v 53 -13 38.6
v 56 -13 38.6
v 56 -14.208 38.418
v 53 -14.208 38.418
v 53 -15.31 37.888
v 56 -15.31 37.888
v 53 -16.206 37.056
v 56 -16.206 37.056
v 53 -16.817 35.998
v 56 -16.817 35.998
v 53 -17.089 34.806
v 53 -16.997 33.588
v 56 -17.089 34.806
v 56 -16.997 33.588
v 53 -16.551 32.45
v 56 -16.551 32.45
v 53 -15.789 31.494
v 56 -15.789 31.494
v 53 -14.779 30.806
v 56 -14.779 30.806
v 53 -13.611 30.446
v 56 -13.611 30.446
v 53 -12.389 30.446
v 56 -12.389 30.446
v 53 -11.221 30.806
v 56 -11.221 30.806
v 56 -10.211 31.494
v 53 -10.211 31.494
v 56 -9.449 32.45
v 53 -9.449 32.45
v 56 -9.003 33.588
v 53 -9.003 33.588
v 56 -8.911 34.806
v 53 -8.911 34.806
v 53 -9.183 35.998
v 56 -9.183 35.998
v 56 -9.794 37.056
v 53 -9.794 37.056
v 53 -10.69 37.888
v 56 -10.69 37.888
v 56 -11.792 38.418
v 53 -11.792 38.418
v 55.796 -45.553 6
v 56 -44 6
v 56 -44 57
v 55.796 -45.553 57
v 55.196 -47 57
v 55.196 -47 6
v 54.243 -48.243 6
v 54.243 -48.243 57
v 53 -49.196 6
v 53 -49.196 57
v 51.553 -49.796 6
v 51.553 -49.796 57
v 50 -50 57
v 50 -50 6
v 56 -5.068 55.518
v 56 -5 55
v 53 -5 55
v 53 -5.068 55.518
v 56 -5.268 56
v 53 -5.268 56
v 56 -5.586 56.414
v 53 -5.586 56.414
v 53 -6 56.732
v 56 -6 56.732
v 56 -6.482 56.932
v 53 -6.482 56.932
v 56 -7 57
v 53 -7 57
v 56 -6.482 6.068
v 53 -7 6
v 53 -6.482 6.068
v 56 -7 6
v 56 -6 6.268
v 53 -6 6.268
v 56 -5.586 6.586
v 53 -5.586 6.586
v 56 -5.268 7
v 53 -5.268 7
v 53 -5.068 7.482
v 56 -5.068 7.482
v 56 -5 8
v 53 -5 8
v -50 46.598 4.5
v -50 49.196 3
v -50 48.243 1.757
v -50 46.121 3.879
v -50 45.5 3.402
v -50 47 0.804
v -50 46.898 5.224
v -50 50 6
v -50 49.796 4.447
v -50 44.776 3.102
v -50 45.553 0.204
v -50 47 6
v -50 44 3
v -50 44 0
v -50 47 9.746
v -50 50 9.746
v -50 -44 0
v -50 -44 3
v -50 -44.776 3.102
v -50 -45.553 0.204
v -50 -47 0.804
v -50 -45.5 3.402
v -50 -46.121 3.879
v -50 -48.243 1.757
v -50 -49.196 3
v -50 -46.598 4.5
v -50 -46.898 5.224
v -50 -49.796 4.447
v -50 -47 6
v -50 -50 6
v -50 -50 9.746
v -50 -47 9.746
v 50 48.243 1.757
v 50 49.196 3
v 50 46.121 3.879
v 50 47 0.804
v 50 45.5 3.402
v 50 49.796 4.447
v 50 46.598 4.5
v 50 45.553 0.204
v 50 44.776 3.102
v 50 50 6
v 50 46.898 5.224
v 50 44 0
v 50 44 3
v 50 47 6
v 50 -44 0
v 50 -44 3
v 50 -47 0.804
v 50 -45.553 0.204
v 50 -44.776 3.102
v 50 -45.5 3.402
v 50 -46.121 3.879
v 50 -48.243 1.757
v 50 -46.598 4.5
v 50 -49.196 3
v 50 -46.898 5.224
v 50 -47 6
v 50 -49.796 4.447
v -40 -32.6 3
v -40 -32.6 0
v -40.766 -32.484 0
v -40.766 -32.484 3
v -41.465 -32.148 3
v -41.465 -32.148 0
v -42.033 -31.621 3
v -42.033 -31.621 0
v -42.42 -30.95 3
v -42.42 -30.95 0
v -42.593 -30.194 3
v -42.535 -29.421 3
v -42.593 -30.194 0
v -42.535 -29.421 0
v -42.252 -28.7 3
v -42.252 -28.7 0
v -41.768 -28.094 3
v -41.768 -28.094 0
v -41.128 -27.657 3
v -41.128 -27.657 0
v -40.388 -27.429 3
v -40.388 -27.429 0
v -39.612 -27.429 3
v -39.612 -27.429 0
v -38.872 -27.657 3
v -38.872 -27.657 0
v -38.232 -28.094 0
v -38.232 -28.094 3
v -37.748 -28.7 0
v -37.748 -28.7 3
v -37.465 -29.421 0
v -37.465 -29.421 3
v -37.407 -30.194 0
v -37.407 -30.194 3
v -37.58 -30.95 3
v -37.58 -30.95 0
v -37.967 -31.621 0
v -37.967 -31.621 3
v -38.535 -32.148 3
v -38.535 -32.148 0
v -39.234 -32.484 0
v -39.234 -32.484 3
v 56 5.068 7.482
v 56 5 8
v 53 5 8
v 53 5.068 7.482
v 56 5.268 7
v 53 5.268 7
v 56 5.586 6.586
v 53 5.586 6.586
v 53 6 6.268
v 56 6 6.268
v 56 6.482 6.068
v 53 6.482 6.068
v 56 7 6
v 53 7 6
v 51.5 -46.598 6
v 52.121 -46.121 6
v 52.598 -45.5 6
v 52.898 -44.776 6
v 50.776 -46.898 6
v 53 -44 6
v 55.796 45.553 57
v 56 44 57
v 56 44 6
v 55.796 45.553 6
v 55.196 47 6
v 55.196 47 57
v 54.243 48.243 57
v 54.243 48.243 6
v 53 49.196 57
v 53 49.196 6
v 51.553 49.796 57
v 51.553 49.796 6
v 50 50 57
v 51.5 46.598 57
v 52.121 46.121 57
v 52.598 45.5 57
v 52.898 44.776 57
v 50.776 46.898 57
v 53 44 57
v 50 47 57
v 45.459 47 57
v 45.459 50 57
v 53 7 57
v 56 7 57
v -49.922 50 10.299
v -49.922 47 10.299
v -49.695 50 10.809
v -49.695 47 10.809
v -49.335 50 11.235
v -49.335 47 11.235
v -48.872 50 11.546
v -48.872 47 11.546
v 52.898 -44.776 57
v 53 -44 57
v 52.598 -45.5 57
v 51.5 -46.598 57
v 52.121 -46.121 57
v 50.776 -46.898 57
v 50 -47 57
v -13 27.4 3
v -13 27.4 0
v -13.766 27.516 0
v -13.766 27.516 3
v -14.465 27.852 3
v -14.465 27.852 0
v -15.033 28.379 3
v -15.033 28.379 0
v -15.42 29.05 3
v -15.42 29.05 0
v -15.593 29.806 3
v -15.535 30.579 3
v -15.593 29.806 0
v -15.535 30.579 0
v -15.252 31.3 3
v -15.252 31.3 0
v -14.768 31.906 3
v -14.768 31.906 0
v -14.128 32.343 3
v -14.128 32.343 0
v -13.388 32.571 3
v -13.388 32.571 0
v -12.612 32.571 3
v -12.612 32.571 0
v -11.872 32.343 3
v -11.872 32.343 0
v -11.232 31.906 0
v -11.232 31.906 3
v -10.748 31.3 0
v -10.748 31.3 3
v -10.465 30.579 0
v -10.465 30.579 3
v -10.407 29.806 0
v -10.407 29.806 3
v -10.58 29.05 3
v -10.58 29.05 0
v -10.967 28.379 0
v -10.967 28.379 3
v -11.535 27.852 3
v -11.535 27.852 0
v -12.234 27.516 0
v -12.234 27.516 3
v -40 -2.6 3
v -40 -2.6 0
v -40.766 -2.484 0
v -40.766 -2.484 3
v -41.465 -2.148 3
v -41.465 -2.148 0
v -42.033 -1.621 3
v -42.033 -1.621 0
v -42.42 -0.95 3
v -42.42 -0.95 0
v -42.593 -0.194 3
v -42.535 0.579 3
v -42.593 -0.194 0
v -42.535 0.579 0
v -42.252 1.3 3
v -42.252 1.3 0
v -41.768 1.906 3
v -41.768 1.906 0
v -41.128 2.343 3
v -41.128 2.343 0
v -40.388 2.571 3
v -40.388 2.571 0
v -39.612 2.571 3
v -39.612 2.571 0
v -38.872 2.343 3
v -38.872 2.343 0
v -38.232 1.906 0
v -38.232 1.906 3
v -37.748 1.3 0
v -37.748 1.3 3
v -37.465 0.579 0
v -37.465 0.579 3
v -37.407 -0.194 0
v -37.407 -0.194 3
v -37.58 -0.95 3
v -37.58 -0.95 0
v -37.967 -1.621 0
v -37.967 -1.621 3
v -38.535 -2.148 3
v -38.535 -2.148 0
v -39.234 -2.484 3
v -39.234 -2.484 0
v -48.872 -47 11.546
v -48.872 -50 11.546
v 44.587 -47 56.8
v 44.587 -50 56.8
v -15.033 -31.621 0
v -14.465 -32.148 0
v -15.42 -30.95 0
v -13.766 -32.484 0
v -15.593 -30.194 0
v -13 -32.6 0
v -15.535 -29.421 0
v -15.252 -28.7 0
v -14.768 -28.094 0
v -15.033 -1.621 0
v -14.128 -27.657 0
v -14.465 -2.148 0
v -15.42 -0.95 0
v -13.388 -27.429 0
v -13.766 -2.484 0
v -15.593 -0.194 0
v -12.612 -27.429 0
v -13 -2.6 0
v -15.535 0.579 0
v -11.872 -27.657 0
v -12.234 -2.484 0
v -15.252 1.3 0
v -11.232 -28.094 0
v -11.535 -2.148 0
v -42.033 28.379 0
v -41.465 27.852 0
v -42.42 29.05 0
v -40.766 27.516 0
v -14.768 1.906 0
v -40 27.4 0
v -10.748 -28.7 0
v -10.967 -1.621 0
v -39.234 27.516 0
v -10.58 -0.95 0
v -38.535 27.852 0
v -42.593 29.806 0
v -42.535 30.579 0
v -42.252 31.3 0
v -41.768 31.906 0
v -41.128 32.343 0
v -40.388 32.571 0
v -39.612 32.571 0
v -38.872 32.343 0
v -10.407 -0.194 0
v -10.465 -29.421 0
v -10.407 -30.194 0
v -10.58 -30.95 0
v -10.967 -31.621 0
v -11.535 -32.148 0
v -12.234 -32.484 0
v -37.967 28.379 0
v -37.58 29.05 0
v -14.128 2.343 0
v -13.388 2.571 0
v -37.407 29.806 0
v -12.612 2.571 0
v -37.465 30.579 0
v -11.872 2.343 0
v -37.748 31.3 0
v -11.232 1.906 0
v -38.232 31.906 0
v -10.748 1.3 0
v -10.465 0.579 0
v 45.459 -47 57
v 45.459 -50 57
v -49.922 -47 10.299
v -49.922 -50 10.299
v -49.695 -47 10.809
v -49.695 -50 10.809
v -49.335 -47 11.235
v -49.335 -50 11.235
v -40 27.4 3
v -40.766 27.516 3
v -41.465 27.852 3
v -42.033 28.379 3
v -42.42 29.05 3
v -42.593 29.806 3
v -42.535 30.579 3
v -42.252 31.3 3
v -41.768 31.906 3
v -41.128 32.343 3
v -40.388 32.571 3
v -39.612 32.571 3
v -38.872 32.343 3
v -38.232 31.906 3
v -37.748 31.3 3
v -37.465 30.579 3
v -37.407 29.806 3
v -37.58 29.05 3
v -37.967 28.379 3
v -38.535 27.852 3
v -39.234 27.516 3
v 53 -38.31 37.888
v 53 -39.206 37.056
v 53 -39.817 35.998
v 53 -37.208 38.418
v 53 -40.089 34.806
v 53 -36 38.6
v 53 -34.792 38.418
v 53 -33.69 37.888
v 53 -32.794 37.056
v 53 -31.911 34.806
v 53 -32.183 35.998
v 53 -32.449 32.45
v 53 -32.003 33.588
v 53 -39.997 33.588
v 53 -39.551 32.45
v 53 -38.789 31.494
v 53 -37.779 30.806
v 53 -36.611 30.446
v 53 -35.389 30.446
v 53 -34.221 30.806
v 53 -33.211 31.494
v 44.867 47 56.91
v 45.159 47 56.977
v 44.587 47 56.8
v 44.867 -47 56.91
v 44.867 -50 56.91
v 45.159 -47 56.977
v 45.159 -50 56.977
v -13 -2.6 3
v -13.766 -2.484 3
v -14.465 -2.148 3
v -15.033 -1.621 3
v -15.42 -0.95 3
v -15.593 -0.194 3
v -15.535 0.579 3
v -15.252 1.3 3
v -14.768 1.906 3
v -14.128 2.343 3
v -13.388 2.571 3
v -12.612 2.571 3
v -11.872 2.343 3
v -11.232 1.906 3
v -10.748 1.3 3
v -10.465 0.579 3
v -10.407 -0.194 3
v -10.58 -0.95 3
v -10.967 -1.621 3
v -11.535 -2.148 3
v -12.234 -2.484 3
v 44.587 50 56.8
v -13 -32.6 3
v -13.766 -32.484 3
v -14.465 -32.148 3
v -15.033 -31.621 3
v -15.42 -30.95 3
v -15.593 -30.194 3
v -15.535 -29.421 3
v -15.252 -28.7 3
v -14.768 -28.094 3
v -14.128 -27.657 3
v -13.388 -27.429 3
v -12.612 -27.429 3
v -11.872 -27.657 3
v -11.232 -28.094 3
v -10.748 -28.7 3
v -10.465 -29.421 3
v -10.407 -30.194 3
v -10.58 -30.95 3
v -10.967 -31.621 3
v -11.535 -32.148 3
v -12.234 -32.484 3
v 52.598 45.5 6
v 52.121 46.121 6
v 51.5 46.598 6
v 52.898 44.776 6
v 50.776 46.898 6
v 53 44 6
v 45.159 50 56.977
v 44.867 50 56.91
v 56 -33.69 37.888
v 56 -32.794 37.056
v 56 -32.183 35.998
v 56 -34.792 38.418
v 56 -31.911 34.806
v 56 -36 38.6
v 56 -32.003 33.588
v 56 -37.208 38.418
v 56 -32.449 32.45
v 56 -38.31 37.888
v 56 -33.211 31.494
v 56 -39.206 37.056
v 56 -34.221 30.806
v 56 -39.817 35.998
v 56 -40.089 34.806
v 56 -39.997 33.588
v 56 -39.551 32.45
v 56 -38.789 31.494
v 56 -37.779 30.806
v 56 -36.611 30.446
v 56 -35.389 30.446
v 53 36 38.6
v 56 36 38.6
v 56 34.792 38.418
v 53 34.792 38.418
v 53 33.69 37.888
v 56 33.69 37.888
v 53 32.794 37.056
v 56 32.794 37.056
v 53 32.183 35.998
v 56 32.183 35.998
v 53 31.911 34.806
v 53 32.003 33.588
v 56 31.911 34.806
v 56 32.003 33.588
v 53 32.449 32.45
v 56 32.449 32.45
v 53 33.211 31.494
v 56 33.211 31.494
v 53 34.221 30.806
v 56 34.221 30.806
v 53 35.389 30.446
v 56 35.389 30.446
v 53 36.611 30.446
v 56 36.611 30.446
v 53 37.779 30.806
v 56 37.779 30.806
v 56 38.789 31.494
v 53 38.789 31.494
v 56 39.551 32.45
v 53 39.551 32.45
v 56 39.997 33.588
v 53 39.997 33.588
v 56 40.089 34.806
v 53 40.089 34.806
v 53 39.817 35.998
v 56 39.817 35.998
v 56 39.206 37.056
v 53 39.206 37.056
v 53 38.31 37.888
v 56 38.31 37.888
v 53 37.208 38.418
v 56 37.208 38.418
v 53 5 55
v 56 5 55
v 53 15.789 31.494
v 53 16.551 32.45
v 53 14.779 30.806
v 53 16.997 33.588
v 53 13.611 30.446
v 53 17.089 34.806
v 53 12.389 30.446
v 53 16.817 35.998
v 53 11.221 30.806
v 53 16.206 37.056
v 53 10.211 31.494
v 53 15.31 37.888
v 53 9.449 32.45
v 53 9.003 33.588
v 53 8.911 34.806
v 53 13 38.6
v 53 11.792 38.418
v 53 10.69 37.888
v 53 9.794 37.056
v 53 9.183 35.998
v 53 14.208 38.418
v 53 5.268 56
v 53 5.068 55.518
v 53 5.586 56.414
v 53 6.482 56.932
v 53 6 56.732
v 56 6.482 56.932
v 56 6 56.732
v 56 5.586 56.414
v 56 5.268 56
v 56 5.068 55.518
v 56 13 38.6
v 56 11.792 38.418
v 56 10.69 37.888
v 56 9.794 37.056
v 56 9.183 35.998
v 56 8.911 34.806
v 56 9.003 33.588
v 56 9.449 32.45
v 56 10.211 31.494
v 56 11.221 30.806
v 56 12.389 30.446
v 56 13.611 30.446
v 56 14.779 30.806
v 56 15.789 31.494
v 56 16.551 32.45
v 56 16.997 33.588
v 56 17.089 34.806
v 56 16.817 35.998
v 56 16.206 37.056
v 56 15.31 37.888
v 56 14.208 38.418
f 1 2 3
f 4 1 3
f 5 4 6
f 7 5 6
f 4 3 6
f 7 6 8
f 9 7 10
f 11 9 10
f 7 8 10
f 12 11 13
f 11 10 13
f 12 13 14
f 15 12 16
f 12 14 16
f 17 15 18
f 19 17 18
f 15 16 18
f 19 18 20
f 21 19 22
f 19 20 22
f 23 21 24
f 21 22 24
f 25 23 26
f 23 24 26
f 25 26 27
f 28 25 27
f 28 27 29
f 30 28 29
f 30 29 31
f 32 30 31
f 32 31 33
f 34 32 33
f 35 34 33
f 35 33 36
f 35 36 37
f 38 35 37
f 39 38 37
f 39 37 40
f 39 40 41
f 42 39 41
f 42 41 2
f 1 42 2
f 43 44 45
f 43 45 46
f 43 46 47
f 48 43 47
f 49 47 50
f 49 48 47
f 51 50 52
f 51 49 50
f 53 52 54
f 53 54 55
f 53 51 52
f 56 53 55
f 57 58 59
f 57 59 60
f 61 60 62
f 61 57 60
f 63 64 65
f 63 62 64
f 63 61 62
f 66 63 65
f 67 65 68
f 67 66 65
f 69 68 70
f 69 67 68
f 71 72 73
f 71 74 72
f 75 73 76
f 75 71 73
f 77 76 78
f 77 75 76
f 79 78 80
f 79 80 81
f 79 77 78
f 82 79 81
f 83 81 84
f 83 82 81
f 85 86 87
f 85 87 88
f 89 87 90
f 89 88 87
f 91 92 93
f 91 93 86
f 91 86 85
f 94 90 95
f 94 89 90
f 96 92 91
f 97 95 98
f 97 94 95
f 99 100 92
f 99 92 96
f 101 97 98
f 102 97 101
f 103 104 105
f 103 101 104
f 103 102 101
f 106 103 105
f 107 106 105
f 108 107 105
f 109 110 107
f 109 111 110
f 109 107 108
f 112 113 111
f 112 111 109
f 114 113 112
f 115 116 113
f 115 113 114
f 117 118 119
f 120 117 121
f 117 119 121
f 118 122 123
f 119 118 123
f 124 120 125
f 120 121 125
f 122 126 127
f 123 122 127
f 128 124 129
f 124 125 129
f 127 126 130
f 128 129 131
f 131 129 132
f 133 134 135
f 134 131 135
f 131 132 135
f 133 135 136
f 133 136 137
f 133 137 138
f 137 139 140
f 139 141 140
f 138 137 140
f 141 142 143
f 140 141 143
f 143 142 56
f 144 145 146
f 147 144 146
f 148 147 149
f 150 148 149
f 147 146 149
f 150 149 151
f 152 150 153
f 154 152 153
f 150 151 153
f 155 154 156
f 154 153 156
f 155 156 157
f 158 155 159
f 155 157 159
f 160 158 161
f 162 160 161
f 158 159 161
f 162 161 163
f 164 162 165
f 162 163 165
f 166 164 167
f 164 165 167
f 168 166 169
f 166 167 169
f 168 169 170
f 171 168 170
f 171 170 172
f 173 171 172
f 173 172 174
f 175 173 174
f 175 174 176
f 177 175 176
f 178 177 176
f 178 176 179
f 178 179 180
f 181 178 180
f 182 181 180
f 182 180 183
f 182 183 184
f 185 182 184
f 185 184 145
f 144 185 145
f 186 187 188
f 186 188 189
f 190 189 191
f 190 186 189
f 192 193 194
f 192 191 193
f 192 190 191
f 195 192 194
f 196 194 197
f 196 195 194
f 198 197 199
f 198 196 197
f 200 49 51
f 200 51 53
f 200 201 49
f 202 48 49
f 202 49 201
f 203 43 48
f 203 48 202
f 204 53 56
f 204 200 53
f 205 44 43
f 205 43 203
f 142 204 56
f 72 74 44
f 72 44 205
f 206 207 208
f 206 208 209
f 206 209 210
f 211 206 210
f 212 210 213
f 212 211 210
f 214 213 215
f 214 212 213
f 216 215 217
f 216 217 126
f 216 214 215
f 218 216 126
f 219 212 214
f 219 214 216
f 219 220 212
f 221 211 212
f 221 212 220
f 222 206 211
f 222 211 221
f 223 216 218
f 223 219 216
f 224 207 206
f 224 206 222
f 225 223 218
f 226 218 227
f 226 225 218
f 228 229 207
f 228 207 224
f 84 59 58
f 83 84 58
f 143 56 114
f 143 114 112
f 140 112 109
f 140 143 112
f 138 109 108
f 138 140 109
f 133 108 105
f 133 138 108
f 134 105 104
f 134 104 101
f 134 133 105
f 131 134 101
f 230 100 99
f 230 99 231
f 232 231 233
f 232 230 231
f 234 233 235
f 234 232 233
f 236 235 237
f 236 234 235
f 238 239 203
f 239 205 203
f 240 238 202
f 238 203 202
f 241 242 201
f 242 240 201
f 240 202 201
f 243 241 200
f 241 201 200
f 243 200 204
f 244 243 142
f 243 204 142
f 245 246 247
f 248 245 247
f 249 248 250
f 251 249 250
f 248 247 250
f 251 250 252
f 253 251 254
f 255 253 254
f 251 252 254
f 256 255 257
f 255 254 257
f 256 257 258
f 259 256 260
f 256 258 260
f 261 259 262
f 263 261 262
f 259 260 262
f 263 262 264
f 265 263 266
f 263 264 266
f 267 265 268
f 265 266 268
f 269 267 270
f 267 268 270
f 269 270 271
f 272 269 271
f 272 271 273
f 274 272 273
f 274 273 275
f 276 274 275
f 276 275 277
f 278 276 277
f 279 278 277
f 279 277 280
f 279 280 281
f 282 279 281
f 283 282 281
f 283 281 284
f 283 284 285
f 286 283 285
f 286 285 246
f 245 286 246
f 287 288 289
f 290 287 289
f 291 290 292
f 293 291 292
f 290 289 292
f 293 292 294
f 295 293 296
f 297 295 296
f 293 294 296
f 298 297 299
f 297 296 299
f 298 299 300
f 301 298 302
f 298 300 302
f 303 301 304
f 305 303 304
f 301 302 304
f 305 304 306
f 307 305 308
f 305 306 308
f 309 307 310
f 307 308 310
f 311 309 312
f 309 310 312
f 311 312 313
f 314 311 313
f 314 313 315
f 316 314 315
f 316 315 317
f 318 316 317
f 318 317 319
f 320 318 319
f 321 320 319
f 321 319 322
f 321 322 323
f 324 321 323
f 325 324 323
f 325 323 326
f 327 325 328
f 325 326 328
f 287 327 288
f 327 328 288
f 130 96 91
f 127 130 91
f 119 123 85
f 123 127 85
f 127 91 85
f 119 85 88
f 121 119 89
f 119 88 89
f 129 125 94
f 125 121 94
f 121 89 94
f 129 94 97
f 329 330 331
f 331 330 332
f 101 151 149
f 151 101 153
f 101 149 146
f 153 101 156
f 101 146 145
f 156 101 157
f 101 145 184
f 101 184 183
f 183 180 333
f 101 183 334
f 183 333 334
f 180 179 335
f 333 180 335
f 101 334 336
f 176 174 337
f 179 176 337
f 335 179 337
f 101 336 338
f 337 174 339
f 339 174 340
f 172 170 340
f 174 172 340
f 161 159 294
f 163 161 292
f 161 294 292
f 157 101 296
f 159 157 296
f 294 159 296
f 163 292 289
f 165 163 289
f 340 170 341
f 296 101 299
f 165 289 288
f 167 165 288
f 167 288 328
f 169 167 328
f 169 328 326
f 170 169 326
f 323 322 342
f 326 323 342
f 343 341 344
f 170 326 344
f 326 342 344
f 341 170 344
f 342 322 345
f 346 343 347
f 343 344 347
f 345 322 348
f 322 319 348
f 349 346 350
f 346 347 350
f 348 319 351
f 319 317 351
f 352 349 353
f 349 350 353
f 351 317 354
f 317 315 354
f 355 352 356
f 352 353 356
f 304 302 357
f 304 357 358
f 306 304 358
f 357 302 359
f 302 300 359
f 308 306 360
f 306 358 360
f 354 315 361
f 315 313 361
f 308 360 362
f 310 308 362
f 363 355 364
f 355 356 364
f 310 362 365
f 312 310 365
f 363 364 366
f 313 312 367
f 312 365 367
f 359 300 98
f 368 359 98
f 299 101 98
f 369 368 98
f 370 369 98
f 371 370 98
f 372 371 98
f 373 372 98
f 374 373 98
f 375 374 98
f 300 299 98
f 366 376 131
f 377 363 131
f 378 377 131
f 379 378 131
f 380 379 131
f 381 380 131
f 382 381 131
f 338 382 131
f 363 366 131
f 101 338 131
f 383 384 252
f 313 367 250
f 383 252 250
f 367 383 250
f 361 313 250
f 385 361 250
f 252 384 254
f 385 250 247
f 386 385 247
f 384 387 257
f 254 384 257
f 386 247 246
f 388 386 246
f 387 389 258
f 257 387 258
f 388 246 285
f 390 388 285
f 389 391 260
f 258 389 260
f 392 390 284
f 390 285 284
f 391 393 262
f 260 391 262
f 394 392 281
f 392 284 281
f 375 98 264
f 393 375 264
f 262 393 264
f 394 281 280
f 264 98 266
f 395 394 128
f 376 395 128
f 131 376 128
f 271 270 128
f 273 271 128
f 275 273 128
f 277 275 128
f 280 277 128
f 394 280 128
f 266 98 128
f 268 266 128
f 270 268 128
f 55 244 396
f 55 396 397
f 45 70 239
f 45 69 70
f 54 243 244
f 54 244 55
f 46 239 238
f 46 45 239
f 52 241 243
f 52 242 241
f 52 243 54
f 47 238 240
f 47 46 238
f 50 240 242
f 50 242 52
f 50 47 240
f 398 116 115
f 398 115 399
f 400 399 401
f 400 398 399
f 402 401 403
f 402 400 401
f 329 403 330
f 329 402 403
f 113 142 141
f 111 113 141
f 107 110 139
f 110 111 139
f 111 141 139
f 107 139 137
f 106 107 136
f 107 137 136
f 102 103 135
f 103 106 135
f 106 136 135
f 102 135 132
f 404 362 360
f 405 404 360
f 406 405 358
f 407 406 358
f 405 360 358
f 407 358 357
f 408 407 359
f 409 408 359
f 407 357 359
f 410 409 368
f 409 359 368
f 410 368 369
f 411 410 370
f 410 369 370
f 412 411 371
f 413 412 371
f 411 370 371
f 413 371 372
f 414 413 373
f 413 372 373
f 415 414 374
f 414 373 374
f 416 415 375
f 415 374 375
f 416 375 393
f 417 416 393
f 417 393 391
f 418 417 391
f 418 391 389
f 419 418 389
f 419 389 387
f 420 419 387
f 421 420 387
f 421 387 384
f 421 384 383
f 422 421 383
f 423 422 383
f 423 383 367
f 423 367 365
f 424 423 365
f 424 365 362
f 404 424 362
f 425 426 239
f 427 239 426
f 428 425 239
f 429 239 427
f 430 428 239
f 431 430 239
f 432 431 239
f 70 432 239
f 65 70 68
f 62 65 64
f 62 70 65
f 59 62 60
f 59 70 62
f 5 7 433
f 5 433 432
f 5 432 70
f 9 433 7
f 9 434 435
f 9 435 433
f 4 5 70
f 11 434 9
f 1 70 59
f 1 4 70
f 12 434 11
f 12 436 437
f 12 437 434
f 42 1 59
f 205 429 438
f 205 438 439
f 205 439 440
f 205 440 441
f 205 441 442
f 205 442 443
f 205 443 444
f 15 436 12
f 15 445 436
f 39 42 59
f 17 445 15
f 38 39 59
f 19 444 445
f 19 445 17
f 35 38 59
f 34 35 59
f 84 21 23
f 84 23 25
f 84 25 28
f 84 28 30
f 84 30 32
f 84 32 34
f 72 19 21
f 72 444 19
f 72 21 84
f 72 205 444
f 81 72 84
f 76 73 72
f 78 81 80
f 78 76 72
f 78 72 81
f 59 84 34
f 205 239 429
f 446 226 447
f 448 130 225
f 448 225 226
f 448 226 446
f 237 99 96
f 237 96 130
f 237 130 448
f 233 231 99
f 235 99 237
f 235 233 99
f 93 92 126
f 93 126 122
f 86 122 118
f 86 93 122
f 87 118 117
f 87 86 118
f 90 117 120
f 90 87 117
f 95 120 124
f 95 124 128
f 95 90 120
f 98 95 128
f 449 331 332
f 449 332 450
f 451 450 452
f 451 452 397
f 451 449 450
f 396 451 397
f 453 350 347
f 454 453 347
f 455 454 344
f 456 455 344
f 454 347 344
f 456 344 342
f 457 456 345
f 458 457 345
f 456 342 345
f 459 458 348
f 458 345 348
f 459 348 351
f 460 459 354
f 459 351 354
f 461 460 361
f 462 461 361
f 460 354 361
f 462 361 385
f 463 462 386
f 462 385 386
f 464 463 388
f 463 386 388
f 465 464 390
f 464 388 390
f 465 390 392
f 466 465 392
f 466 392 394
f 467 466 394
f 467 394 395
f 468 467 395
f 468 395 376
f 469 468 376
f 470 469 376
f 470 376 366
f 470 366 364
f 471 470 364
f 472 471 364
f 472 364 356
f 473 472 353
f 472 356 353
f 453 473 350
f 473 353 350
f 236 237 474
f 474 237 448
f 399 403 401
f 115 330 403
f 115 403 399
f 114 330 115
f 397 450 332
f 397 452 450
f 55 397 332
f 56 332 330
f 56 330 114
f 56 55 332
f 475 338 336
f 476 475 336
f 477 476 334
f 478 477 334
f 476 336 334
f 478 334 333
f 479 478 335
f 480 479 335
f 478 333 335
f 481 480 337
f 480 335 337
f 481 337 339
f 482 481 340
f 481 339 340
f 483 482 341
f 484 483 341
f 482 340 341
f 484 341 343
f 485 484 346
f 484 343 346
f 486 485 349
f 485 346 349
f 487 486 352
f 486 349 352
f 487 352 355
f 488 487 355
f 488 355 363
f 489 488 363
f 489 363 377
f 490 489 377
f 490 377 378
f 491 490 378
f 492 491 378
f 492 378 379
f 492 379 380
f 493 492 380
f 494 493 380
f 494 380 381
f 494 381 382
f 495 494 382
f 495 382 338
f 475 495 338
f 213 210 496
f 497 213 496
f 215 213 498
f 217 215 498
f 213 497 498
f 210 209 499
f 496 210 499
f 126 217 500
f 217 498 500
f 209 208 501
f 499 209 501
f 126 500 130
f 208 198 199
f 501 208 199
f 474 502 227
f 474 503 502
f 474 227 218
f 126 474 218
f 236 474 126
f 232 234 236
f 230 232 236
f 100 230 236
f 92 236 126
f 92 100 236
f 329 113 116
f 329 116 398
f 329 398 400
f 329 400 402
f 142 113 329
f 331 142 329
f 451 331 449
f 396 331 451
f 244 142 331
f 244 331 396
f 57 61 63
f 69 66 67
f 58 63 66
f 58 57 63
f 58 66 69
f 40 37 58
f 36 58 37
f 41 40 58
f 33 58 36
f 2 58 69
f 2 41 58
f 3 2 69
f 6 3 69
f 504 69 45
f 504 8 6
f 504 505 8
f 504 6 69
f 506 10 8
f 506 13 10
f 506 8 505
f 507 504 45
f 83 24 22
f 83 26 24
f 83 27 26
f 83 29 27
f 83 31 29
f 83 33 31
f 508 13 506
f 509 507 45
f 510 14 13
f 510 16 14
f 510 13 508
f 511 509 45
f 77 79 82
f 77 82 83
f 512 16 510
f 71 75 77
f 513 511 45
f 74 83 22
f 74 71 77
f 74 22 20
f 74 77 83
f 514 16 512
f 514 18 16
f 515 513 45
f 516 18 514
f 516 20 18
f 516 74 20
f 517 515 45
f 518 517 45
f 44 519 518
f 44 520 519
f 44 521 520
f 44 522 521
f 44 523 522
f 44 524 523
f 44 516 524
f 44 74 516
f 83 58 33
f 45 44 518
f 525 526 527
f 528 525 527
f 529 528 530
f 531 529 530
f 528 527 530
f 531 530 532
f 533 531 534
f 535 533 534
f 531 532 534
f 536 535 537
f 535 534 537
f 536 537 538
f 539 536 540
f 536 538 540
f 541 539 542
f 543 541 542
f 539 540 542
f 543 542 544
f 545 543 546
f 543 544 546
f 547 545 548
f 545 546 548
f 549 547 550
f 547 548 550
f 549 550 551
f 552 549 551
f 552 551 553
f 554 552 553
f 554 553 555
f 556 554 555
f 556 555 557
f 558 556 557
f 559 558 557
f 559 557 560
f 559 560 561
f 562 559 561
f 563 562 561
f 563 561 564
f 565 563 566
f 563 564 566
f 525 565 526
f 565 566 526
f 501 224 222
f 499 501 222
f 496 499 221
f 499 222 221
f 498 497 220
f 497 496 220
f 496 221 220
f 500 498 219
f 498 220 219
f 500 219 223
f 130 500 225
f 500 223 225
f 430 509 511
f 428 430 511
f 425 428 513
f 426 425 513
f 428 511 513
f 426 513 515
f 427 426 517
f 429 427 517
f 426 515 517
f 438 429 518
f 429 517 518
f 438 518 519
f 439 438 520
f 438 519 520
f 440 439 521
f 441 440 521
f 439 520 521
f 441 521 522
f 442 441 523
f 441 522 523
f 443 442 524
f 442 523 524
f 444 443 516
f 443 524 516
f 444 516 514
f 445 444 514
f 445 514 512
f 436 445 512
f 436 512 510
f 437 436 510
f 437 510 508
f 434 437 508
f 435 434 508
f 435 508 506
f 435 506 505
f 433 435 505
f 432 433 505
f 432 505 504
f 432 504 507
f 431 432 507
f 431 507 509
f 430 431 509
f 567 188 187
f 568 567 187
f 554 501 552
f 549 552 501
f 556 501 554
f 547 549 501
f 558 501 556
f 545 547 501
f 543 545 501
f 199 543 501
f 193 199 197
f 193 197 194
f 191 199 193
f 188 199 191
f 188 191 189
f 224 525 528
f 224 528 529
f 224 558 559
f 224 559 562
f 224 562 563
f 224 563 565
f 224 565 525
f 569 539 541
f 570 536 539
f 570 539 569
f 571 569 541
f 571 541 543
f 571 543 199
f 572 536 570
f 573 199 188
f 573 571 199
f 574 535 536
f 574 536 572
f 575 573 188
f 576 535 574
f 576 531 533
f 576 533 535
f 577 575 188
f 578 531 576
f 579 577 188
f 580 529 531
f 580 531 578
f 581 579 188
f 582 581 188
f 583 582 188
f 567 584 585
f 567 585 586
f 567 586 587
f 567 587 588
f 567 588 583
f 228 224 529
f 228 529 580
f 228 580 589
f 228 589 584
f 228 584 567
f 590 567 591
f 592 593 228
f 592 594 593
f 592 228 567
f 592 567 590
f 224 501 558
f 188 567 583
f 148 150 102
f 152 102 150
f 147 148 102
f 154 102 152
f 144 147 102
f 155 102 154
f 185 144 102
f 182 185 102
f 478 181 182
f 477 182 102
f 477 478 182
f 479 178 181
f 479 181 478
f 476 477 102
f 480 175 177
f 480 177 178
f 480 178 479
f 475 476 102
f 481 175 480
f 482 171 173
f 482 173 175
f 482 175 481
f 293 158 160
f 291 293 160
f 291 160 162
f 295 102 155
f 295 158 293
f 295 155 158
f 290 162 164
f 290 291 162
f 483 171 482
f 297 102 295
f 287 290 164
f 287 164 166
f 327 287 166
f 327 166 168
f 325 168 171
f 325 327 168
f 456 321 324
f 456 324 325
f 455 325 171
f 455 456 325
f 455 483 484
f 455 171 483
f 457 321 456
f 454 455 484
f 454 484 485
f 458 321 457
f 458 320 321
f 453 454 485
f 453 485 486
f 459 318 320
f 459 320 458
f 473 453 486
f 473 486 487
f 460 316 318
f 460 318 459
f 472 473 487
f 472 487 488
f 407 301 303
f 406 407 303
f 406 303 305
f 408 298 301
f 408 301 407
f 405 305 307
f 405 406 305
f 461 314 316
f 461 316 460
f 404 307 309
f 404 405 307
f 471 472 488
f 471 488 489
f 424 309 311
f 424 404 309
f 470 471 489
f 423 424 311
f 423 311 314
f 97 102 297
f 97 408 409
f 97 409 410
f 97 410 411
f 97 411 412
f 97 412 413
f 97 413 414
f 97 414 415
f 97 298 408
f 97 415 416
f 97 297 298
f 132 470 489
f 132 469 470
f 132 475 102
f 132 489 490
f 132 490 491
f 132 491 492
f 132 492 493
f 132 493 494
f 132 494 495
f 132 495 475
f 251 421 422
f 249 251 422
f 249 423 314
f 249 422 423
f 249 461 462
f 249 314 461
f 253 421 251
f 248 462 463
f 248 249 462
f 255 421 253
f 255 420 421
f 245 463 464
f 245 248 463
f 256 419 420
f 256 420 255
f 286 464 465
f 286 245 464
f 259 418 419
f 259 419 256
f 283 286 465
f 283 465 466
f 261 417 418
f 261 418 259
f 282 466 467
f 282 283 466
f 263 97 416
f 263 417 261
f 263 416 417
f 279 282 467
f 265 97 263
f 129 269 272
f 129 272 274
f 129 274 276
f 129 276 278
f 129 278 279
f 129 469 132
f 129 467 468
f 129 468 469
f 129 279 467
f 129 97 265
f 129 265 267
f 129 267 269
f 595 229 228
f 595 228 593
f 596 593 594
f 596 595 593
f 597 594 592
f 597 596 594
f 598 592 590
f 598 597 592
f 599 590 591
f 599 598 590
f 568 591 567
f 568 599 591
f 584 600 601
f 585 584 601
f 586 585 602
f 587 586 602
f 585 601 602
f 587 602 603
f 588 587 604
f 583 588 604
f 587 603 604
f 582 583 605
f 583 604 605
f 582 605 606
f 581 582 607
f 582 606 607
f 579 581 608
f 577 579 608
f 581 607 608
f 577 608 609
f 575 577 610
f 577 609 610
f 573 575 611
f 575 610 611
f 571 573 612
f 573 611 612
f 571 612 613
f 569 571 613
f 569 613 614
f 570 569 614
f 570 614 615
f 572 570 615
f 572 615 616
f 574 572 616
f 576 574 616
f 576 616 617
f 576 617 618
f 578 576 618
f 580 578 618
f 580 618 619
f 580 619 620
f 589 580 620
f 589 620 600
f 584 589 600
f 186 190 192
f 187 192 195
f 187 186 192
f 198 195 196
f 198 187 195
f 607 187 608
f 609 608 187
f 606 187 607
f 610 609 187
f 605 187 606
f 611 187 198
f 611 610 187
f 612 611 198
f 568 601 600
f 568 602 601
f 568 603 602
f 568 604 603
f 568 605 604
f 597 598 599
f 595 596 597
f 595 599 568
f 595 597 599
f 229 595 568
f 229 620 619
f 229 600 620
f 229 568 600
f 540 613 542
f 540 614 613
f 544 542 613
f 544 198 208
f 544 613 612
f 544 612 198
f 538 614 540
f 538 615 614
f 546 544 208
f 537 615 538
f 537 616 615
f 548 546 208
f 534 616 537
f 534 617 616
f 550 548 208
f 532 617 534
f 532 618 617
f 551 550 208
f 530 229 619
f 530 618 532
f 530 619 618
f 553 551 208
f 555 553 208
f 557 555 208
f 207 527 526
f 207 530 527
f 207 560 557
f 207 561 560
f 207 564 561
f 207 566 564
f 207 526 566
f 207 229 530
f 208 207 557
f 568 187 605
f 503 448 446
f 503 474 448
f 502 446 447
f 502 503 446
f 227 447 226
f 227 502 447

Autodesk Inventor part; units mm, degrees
ref_plane "YZ Plane" through (0, 0, 0) normal (1, 0, 0) x (0, 1, 0)
ref_plane "XZ Plane" through (0, 0, 0) normal (0, 1, 0) x (-1, 0, 0)
ref_plane "XY Plane" through (0, 0, 0) normal (0, 0, 1) x (1, 0, 0)
sketch "スケッチ1" plane through (0, 0, 0) normal (0, 0, 1) x (1, 0, 0)
  line L0 (-50, -50) -> (50, -50)
  line L1 (50, -50) -> (50, 50)
  line L2 (50, 50) -> (-50, 50)
  line L3 (-50, 50) -> (-50, -50)
  line L4 (-50, -50) -> (50, 50) construction
  line L5 (50, -50) -> (-50, 50) construction
  point P0 (0, 0)
  dimension "d0" = 100
  dimension "d1" = 100
extrude "プレート1" add sketch "スケッチ1" along normal blind 3
sketch "スケッチ2" plane through (-50, 47, 0) normal (0, 1, 0) x (-1, 0, 0)
  line L0 (-100, 0) -> (0, 0)
  line L1 (0, 0) -> (0, 57)
  line L2 (0, 57) -> (-100, 57)
  line L3 (-100, 57) -> (-100, 0)
edge flange "フランジ1" height 57 angle 90 thickness 3 bend radius 3 thickness toward (0, 1, 0) relief tear relief width 3 relief depth 1.5 corner gap 3 corner form 0 edges at (0, 50, 3) (0, -50, 3) wall of the first edge with corners at (50, 47, 0) (-50, 47, 0) (-50, 47, 57) (50, 47, 57)
bend "曲げ1"
corner "コーナー1"
sketch "スケッチ3" plane through (53, 44, 57) normal (1, 0, 0) x (0, 1, 0)
  line L0 (0, -51) -> (0, 0)
  line L1 (0, 0) -> (-39, 0)
  line L2 (-39, 0) -> (-39, -51)
  line L3 (-39, -51) -> (0, -51)
edge flange "フランジ2" height 45 angle 90 thickness 3 bend radius 3 thickness toward (1, 0, 0) relief tear relief width 3 relief depth 1.5 corner gap 3 corner form 0 edges at (50, 47, 31.5) (50, -47, 31.5) wall of the first edge with corners at (53, 44, 6) (53, 44, 57) (53, 5, 57) (53, 5, 6)
bend "曲げ2"
corner "コーナー2"
sketch "スケッチ4" plane through (-50, -50, 6) normal (0, -1, 0) x (1, 0, 0)
  line L0 (0, 0) -> (0, 51) projected
  line L1 (0, 5) -> (95, 51)
  line L2 (0, 51) -> (100, 51) projected
  line L3 (0, 0) -> (100, 0) projected
  line L4 (100, 51) -> (100, 0) projected
  point P0 (50, -6)
  dimension "d23" = 5
  dimension "d24" = 5
extrude "押し出し1" cut sketch "スケッチ4" against normal through all contours L0 L2 L1
fillet "フィレット1" radius 2 8 edges at (-50, 48.5, 11) (-50, -48.5, 11) (45, 48.5, 57) (45, -48.5, 57) (54.5, 5, 57) (54.5, -5, 6) (54.5, 5, 6) (54.5, -5, 57)
sketch "スケッチ5" plane through (0, 0, 3) normal (0, 0, 1) x (1, 0, 0)
  line L0 (-40, -30) -> (-13, -30)
  line L1 (-13, -30) -> (-13, 30)
  line L2 (-13, 30) -> (-40, 30)
  line L3 (-40, 30) -> (-40, -30)
  line L4 (-40, -30) -> (-13, 30) construction
  line L5 (-13, -30) -> (-40, 30) construction
  line L6 (-50, -44) -> (-50, 44) projected
  point P0 (0, 0)
  point P1 (-26.5, 0)
  point P2 (-26.5, 0)
  point P3 (-40, 0)
  point P4 (-13, 0)
  dimension "d28" = 27
  dimension "d29" = 10
  dimension "d30" = 60
hole "穴1" at (-40, 0, 3) at (-13, 0, 3) at (-40, -30, 3) at (-40, 30, 3) at (-13, -30, 3) at (-13, 30, 3) direction (0, 0, -1) diameter 5.2 end through all
sketch "スケッチ6" plane through (53, 44, 6) normal (-1, 0, 0) x (0, 0, 1)
  arc A0 (0, -37) -> (2, -39) centre (2, -37) ccw projected
  line L0 (2, -39) -> (49, -39) projected
  arc A1 (49, -39) -> (51, -37) centre (49, -37) ccw projected
  line L1 (51, -37) -> (51, 0) projected
  line L2 (51, 0) -> (0, 0) projected
  line L3 (0, -37) -> (0, 0) projected
  arc A2 (2, -49) -> (0, -51) centre (2, -51) ccw projected
  line L4 (0, -51) -> (0, -88) projected
  line L5 (0, -88) -> (51, -88) projected
  line L6 (51, -51) -> (51, -88) projected
  arc A3 (51, -51) -> (49, -49) centre (49, -51) ccw projected
  line L7 (49, -49) -> (2, -49) projected
  point P0 (-6, -44)
  point P1 (28.5, -8)
  point P2 (28.5, -31)
  point P3 (28.5, -57)
  point P4 (28.5, -80)
  dimension "d38" = 22.5
  dimension "d39" = 8
  dimension "d40" = 8
  dimension "d41" = 8
  dimension "d42" = 8
hole "穴2" at (53, 36, 34.5) at (53, 13, 34.5) at (53, -13, 34.5) at (53, -36, 34.5) direction (1, 0, 0) diameter 8.2 end through all
equation "\"d36\" = Thickness"
equation "\"d48\" = Thickness"
equation "\"d2\" = Thickness"
equation "\"d3\" = BendReliefWidth"
equation "\"d4\" = BendReliefDepth"
equation "\"d5\" = MinimumRemnant"
equation "\"d6\" = TransitionRadius"
equation "\"d9\" = BendRadius"
equation "\"d10\" = CornerReliefSize"
equation "\"d11\" = GapSize"
equation "\"d12\" = JacobiRadiusSize"
equation "\"d13\" = BendReliefWidth"
equation "\"d14\" = BendReliefDepth"
equation "\"d15\" = MinimumRemnant"
equation "\"d16\" = TransitionRadius"
equation "\"d19\" = BendRadius"
equation "\"d20\" = CornerReliefSize"
equation "\"d21\" = GapSize"
equation "\"d22\" = JacobiRadiusSize"
equation "\"BendRadius\" = Thickness"
equation "\"BendReliefWidth\" = Thickness"
equation "\"BendReliefDepth\" = 0.5 * Thickness"
equation "\"CornerReliefSize\" = 4 * Thickness"
equation "\"MinimumRemnant\" = 2 * Thickness"
equation "\"TransitionRadius\" = BendRadius"
equation "\"JacobiRadiusSize\" = BendRadius"
equation "\"GapSize\" = Thickness"
equation "\"Thickness\" = 3"
properties part number "CCM_Mount_A"
